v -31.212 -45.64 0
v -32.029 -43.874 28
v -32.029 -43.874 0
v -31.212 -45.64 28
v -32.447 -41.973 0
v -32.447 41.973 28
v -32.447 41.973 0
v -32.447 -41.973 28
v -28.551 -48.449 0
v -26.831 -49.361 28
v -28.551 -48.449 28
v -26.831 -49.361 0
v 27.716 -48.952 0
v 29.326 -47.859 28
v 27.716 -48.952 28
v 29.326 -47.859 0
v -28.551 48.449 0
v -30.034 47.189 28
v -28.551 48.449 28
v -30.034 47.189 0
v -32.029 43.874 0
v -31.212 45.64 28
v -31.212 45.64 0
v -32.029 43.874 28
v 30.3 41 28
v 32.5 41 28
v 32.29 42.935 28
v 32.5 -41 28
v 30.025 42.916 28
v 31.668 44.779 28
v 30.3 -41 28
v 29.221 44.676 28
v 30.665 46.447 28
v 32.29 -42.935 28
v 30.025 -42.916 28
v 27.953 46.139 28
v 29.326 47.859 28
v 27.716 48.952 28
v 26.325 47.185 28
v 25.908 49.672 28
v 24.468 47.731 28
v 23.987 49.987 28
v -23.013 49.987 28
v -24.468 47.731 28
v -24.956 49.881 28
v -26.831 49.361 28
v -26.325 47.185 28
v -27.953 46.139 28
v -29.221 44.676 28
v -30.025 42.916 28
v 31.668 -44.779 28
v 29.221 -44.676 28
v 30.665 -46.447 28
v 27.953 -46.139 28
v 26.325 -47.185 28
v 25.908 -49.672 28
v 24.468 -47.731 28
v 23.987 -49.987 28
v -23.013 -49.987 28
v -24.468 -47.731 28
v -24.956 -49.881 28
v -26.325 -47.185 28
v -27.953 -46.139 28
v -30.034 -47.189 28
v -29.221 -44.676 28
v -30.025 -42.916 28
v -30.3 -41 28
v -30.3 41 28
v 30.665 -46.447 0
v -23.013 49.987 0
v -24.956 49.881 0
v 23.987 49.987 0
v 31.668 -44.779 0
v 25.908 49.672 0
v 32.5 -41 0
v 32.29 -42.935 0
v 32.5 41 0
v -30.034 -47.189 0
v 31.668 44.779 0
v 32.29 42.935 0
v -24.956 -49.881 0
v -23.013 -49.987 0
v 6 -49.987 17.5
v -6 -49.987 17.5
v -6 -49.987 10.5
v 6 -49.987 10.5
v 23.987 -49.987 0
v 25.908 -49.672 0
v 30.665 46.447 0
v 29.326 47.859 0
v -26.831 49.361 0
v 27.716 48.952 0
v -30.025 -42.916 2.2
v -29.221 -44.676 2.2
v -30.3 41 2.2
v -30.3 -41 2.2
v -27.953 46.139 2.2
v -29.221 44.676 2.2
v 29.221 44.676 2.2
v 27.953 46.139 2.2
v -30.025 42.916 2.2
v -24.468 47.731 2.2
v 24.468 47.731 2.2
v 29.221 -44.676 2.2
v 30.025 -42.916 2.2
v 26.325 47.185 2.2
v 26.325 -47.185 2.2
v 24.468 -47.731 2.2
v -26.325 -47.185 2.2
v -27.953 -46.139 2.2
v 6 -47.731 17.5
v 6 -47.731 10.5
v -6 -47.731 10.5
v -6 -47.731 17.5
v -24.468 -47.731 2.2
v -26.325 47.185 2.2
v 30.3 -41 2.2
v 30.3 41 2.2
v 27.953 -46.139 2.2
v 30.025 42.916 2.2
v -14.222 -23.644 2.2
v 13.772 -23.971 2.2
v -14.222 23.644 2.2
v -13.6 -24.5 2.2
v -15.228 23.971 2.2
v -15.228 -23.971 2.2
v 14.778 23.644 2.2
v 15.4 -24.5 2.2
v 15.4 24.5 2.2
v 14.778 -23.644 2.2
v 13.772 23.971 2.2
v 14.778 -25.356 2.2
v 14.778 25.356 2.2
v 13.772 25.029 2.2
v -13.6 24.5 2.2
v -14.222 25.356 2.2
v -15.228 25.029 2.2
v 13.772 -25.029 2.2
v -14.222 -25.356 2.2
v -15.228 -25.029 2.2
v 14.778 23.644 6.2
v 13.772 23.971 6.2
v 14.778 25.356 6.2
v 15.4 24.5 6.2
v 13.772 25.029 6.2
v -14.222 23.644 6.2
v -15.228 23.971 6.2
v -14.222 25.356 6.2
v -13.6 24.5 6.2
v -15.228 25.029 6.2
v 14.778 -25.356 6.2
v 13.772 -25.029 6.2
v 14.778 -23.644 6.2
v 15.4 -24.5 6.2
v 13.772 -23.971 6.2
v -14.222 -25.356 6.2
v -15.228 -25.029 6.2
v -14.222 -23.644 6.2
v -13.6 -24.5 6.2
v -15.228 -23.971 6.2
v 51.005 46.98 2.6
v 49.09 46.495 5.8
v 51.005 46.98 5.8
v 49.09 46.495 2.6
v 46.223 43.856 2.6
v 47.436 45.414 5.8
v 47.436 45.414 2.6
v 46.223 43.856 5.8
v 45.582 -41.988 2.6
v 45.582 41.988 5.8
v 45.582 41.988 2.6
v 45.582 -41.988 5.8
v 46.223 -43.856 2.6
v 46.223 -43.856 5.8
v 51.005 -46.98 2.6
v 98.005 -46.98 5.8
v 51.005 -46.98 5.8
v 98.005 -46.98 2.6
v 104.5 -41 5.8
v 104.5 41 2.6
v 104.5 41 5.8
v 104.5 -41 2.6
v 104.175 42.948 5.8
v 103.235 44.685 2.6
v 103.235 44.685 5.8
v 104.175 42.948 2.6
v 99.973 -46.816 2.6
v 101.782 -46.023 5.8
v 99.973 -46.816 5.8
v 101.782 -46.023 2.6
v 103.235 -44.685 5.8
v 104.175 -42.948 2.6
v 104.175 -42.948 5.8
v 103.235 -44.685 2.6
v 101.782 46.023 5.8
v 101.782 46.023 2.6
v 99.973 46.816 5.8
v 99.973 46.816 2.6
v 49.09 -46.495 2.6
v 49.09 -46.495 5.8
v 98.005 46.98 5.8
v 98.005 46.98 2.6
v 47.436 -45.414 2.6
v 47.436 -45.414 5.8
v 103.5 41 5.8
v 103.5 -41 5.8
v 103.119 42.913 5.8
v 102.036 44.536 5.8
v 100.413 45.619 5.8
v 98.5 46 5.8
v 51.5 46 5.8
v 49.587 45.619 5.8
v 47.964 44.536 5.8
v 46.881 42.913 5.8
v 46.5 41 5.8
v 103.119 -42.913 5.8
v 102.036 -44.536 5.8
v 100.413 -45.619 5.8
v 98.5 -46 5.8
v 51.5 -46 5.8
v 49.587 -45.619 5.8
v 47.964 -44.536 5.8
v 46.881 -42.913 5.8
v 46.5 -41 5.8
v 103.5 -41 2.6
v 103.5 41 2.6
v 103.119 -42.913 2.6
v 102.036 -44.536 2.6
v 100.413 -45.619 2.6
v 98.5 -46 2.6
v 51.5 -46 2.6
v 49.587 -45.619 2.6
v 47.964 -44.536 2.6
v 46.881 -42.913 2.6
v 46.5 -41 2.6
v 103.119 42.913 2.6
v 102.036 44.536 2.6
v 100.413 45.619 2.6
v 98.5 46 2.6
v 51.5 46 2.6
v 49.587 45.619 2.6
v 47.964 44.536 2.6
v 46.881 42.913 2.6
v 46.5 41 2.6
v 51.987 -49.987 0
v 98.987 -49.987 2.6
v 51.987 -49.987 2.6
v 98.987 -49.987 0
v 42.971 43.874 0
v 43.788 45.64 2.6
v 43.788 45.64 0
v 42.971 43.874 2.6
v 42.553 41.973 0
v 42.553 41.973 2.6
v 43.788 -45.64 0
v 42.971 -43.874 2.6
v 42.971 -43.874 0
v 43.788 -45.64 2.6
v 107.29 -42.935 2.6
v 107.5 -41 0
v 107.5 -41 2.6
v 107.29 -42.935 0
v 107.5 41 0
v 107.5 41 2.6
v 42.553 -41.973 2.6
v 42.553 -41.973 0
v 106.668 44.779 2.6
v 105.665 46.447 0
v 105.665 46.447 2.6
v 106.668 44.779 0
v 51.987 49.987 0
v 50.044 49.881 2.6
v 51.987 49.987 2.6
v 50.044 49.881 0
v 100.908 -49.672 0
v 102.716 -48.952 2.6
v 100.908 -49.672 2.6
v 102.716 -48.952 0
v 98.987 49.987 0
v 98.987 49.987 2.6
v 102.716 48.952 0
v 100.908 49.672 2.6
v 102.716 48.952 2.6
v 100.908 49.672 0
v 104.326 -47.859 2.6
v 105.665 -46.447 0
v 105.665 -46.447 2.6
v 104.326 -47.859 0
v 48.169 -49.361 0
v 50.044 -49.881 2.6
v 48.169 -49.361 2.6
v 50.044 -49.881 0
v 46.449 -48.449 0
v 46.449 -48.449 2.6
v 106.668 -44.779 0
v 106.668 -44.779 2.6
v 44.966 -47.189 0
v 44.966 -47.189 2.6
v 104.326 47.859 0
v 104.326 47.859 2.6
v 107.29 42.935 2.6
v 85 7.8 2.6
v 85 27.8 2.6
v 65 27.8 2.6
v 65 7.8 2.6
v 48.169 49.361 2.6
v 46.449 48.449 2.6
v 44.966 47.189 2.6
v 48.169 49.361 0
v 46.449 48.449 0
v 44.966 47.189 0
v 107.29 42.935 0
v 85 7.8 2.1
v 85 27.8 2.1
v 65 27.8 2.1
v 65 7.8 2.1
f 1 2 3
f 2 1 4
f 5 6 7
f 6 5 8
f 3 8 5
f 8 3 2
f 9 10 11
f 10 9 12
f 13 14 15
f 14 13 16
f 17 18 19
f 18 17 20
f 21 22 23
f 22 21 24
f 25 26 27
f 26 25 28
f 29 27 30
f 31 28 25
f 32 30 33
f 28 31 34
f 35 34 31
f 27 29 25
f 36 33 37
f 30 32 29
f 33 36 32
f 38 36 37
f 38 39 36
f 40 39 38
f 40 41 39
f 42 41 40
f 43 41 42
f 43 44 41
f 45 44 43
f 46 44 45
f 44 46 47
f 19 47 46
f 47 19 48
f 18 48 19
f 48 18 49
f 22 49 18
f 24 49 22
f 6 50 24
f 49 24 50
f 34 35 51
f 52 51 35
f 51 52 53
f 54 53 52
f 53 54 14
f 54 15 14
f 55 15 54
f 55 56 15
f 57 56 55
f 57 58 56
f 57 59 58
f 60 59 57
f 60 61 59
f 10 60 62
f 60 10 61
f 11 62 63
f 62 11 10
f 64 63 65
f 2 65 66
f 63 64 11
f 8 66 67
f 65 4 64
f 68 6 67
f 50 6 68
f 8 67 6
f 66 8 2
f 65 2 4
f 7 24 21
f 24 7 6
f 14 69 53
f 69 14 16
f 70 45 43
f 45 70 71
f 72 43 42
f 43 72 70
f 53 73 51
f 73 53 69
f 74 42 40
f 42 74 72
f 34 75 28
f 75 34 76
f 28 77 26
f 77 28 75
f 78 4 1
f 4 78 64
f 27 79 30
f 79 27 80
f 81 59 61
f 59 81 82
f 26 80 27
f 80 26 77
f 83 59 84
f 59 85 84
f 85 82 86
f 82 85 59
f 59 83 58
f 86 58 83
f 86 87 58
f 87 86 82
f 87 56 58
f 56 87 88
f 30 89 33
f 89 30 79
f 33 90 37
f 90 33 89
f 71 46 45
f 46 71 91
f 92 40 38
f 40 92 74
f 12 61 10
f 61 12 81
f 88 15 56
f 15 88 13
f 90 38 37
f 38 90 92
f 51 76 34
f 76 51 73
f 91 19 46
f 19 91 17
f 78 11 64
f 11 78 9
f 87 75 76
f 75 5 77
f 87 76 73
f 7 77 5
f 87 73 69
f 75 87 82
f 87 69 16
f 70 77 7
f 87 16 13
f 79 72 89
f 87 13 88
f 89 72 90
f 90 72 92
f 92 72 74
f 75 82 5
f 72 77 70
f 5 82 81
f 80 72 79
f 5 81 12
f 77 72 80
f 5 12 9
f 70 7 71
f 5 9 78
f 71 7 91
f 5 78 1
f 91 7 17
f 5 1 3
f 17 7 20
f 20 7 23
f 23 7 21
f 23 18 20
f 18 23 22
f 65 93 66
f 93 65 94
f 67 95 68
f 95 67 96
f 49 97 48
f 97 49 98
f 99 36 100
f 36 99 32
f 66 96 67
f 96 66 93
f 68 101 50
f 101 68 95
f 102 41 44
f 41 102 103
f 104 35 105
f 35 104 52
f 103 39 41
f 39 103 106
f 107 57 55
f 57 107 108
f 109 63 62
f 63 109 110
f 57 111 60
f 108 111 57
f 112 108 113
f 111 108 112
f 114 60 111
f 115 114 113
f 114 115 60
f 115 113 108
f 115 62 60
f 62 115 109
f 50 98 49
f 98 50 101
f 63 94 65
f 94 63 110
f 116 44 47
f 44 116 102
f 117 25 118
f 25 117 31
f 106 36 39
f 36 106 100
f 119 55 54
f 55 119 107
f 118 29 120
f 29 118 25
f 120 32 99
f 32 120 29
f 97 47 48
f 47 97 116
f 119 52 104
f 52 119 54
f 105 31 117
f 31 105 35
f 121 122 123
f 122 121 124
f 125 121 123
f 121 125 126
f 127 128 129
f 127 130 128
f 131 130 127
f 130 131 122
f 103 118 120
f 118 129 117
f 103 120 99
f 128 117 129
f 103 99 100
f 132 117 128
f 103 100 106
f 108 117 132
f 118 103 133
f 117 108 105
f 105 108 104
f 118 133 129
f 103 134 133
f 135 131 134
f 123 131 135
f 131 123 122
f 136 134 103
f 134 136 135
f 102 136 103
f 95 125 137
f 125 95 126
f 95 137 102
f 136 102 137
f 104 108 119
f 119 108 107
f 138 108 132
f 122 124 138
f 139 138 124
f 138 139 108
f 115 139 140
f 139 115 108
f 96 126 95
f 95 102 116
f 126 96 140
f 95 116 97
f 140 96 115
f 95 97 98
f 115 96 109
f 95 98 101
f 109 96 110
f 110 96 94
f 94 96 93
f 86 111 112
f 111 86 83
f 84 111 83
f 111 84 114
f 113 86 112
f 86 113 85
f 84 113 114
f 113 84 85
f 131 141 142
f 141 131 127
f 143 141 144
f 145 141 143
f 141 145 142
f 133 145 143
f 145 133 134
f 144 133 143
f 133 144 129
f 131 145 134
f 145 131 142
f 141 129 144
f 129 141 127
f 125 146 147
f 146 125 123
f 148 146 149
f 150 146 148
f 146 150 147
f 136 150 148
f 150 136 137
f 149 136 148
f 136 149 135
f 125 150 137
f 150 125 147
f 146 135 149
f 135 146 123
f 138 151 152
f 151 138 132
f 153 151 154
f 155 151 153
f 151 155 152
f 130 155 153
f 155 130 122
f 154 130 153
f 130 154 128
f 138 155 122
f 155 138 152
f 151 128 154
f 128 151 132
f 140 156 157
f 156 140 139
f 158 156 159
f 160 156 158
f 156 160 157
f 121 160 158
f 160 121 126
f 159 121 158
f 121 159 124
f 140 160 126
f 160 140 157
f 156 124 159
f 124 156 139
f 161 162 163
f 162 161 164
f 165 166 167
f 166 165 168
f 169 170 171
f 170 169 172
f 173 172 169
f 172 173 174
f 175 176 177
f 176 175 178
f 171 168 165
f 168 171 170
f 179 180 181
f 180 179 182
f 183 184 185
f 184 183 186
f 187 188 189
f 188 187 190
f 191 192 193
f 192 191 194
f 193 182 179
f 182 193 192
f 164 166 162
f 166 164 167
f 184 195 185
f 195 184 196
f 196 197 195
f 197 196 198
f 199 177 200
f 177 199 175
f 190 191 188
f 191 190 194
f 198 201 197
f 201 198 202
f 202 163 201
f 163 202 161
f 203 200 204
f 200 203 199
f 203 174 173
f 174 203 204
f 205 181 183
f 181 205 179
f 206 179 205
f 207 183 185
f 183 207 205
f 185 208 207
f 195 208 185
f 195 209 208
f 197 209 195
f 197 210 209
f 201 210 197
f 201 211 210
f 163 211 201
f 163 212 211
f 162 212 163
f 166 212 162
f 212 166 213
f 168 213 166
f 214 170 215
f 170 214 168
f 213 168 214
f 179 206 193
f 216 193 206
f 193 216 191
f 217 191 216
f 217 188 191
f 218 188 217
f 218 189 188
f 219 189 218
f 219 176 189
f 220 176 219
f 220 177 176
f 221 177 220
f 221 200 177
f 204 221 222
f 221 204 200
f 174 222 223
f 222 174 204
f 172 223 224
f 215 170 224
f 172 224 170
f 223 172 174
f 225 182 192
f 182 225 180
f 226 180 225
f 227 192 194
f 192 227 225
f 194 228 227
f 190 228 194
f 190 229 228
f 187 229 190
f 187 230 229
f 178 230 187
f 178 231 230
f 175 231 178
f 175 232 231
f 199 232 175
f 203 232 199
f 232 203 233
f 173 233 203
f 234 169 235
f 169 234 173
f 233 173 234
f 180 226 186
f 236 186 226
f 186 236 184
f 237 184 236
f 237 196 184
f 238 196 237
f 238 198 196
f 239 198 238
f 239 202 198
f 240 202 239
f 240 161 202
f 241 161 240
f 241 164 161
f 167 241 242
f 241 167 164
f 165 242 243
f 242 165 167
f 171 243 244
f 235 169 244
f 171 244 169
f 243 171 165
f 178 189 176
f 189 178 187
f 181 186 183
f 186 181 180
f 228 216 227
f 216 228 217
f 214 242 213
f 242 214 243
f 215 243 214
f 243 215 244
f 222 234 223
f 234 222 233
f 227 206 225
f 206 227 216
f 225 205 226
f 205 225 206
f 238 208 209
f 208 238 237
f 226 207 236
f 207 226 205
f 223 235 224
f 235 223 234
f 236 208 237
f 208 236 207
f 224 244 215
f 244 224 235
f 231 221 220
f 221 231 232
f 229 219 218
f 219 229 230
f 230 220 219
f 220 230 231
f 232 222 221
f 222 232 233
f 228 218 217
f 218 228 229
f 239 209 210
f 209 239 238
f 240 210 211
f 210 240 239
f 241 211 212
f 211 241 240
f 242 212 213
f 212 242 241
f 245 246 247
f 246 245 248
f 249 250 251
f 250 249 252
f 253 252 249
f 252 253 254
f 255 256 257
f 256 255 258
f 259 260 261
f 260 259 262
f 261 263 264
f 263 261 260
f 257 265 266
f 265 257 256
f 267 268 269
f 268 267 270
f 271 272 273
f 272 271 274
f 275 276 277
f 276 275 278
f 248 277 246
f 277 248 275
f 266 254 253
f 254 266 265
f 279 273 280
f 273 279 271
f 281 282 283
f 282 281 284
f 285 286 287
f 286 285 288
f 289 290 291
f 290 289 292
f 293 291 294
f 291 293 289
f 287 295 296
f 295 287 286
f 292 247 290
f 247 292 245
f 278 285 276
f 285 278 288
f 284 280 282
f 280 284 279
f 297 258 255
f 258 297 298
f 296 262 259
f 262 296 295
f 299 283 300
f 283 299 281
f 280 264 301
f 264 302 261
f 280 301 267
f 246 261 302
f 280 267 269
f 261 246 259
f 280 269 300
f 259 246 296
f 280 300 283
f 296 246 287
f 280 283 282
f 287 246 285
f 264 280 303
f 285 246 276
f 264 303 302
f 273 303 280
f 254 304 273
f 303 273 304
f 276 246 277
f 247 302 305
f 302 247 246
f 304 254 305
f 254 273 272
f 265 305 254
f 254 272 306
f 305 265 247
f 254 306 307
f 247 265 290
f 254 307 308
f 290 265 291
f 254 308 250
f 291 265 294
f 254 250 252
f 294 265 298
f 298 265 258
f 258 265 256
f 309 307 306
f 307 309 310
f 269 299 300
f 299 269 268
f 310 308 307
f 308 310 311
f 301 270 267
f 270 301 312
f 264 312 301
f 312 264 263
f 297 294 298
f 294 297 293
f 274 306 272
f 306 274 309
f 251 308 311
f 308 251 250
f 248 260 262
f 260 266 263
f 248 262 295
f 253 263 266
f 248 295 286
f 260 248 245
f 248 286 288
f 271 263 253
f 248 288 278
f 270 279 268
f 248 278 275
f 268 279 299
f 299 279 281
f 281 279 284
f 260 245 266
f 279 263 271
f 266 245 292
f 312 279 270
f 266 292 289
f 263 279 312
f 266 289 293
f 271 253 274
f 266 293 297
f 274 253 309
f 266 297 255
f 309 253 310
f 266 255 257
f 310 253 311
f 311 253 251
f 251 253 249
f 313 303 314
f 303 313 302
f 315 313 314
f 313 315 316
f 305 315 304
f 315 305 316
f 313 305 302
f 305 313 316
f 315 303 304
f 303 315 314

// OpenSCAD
//$fn = 80;

// -------- DIMENSIONS COMMUNES --------
box_L    = 65;
box_W    = 100;
box_H    = 28;
corner_r = 9;
wall     = 2.2;
floor_t  = 2.2;
spacing  = 10;

// -------- USB-C XIAO (face avant Y-) --------
usb_w = 12;
usb_h = 7;
usb_x = 0;
usb_z = 14;

// -------- DIMENSIONS PCB --------
pcb_L      = 34;
pcb_W      = 54;
pcb_corner = 2.5;
hole_dx    = pcb_L - 2 * pcb_corner;
hole_dy    = pcb_W - 2 * pcb_corner;
pcb_x      = 0;
pcb_y      = 0;
peg_d      = 1.8;
peg_h      = 4.0;

// -------- COUVERCLE --------
lid_t        = 2.6;
clearance    = 0.8;
lip_h        = 3.2;
lip_t        = 1.0;
sensor_win_L = 20;
sensor_win_W = 20;
sensor_win_x = 0;                        // centré en X
sensor_win_y = -(box_W/2 - 30- wall);  // décalé vers Y- (côté USB)

// -------- OUTILS --------
module rr2d(L, W, r){
  r2 = min(r, min(L,W)/2 - 0.01);
  hull(){
    translate([ L/2-r2,  W/2-r2]) circle(r=r2);
    translate([-L/2+r2,  W/2-r2]) circle(r=r2);
    translate([ L/2-r2, -W/2+r2]) circle(r=r2);
    translate([-L/2+r2, -W/2+r2]) circle(r=r2);
  }
}
module rr3d(L, W, H, r){
  linear_extrude(height=H) rr2d(L,W,r);
}

// -------- SUPPORTS PCB (4 coins) --------
module pcb_mount(){
  positions = [
    [ hole_dx/2,  hole_dy/2],
    [-hole_dx/2,  hole_dy/2],
    [ hole_dx/2, -hole_dy/2],
    [-hole_dx/2, -hole_dy/2]
  ];
  for (p = positions){
    translate([pcb_x + p[0], pcb_y + p[1], floor_t])
      cylinder(d=peg_d, h=peg_h);
  }
}

// -------- BASE --------
module base_open(){
  difference(){
    rr3d(box_L, box_W, box_H, corner_r);
    translate([0,0,floor_t])
      rr3d(box_L-2*wall, box_W-2*wall,
           box_H-floor_t+0.3,
           max(corner_r-wall,1));
    // Trou USB-C (face avant Y-)
    translate([usb_x, -box_W/2 - 0.01, usb_z])
      cube([usb_w, wall+6, usb_h], center=true);
  }
  pcb_mount();
}

// -------- COUVERCLE --------
module lid_full(){
  outer_L = box_L - 2*(wall + clearance);
  outer_W = box_W - 2*(wall + clearance);
  inner_L = box_L - 2*(wall + clearance + lip_t);
  inner_W = box_W - 2*(wall + clearance + lip_t);

  difference(){
    union(){
      rr3d(box_L, box_W, lid_t, corner_r);
      translate([0, 0, -lip_h])
        difference(){
          rr3d(outer_L, outer_W, lip_h,
               max(corner_r-(wall+clearance),1));
          translate([0, 0, -0.05])
            rr3d(inner_L, inner_W, lip_h+0.1,
                 max(corner_r-(wall+clearance+lip_t),1));
        }
    }
    // Fenêtre radar C1001 côté Y- (même côté que USB)
    translate([sensor_win_x, sensor_win_y, -lid_t/2])
      cube([sensor_win_L, sensor_win_W, lid_t+1], center=true);
  }
}

// -------- RENDU FINAL : BASE + COUVERCLE CÔTE À CÔTE --------
translate([0, 0, 0])
  base_open();

translate([box_L + spacing, 0, lid_t])
  rotate([180, 0, 0])
    lid_full();
